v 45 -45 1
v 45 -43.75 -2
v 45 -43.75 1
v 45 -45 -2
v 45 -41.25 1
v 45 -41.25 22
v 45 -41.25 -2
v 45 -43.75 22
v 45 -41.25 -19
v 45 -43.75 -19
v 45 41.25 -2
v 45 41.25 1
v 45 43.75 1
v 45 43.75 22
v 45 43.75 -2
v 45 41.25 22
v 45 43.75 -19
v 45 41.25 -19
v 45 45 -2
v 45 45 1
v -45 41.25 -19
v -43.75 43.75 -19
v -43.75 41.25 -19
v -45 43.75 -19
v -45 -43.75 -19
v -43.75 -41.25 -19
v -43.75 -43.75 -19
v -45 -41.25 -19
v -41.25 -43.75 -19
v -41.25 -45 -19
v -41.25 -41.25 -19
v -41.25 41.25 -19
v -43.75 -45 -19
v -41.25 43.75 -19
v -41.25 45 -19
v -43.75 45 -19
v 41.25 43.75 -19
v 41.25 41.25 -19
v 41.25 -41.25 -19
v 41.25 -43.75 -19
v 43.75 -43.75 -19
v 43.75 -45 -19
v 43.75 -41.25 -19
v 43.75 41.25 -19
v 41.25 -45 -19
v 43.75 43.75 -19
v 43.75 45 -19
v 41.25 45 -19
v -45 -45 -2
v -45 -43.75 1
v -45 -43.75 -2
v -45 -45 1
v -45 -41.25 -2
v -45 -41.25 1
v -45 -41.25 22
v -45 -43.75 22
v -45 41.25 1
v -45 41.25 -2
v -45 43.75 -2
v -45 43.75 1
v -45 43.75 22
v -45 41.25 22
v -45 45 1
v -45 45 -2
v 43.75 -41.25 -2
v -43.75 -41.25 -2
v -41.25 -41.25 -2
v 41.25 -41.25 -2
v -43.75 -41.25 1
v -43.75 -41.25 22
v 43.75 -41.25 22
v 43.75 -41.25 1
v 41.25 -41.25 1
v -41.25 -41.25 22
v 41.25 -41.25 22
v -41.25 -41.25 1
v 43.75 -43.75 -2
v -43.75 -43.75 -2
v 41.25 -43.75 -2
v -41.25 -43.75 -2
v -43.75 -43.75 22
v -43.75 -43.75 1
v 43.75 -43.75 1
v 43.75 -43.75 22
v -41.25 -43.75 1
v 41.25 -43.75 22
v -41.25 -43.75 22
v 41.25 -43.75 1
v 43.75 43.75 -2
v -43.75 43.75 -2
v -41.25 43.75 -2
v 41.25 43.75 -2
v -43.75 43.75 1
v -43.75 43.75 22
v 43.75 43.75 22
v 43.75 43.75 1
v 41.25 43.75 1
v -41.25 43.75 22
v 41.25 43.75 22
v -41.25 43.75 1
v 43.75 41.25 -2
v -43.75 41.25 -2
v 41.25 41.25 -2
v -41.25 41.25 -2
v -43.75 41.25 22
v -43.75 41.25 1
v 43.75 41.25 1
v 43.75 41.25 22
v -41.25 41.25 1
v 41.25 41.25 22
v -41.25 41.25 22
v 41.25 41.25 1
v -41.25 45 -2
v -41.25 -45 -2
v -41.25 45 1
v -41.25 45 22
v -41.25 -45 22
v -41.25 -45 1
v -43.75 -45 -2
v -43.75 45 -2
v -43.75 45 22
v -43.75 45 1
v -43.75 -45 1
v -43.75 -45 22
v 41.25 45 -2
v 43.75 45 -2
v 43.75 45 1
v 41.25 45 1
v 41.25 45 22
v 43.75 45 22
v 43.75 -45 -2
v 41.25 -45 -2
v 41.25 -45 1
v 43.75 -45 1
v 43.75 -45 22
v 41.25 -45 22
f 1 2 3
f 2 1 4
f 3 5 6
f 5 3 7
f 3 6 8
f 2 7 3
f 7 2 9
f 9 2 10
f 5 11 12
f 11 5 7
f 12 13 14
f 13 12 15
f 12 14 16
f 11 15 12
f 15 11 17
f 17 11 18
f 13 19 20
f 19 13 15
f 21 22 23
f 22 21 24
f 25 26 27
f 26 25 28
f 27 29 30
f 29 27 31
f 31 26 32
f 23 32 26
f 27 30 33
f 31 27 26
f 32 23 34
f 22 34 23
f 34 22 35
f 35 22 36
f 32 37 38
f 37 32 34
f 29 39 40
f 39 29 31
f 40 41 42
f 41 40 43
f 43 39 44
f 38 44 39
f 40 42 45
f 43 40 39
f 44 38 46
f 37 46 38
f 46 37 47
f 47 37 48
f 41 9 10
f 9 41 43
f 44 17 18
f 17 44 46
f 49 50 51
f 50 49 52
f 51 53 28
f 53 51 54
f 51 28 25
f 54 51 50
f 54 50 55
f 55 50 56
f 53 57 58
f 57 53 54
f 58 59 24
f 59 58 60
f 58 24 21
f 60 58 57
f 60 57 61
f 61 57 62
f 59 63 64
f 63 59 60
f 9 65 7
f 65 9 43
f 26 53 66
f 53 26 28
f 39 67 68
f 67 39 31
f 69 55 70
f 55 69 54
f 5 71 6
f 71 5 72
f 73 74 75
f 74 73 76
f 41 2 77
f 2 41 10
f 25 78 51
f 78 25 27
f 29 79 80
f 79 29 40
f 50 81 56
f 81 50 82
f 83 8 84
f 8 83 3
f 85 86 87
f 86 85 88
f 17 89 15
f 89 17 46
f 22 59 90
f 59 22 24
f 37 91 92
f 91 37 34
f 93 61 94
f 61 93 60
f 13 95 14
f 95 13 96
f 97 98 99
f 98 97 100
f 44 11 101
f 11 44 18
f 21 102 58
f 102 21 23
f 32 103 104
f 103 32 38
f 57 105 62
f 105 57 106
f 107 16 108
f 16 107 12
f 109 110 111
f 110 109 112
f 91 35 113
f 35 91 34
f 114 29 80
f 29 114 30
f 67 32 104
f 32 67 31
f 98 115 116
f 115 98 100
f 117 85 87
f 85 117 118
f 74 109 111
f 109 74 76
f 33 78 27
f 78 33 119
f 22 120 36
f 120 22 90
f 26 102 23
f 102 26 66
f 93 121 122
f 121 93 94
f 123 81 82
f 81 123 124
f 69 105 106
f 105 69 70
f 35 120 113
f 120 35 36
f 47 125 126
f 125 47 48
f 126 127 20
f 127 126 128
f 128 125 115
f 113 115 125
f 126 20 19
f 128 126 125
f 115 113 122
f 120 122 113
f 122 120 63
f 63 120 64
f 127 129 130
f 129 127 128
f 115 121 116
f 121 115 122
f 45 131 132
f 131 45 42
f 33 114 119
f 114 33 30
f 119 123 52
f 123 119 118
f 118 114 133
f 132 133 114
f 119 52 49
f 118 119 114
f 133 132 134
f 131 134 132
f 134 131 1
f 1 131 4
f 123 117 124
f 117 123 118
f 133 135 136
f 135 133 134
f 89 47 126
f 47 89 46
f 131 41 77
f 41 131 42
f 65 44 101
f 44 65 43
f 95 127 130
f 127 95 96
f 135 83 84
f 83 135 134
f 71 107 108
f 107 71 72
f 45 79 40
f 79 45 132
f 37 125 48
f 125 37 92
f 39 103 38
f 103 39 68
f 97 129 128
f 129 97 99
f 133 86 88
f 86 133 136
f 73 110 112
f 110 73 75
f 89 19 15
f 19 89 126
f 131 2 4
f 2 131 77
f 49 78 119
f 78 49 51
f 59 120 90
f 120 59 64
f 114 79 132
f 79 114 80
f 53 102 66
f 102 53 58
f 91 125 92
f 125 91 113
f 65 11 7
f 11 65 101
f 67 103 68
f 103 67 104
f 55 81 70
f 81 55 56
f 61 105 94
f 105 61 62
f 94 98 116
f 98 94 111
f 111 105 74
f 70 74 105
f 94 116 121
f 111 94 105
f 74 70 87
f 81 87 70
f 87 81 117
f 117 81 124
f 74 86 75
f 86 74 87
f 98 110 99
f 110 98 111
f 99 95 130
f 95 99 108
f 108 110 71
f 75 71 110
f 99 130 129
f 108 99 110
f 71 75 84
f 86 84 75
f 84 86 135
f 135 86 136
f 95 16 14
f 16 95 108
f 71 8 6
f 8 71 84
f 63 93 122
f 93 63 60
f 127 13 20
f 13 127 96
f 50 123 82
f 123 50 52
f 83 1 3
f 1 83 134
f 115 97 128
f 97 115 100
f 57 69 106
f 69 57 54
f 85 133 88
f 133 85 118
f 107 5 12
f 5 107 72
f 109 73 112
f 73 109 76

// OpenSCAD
// Dimensions
outer_size = 90;          // outer X/Y size in mm
wall_thickness = 2.5;     // wall thickness in mm
top_thickness = 2;        // top plate thickness in mm
height = 40;              // total height from top plate to open top
hole_pattern_size = 71.5; // screw hole pattern square size in mm
hole_diameter = 4.5;      // screw hole diameter in mm
notch_width = 12;         // notch width in mm
notch_depth = 8;          // notch depth from top (40 - 32) in mm

// Derived dimensions
inner_size = outer_size - 2 * wall_thickness;
top_plate_size = outer_size;

// Screw hole positions (4 holes on square pattern)
hole_offset = hole_pattern_size / 2;

// Notch position: centered on one wall (Y = -inner_size/2 wall)
notch_x_center = 0;
notch_y_start = -inner_size/2;
notch_y_end = notch_y_start + notch_width;
notch_z_start = height - notch_depth;

// Top plate
module top_plate() {
    translate([0, 0, -top_thickness/2])
        cube([outer_size, outer_size, top_thickness], center=true);
}

// Walls
module walls() {
    // Front wall (Y negative side)
    translate([0, -inner_size/2, top_thickness/2])
        cube([outer_size, wall_thickness, height], center=true);
    
    // Back wall (Y positive side)
    translate([0, inner_size/2, top_thickness/2])
        cube([outer_size, wall_thickness, height], center=true);
    
    // Left wall (X negative side)
    translate([-inner_size/2, 0, top_thickness/2])
        cube([wall_thickness, outer_size, height], center=true);
    
    // Right wall (X positive side)
    translate([inner_size/2, 0, top_thickness/2])
        cube([wall_thickness, outer_size, height], center=true);
}

// Screw holes
module screw_holes() {
    for (x = [-1, 1]) {
        for (y = [-1, 1]) {
            translate([x * hole_offset, y * hole_offset, -0.01])
                cylinder(h = top_thickness + 0.02, r = hole_diameter/2, $fn = 64);
        }
    }
}

// Notch for power cable
module notch() {
    // Notch in front wall (Y negative side)
    translate([0, 0, height - notch_depth/2])
        cube([notch_width + 0.1, wall_thickness + 0.1, notch_depth + 0.02], center=true);
}

// Assemble the housing
module housing() {
    union() {
        top_plate();
        walls();
    }
    
    // Subtract screw holes
    translate([0, 0, top_thickness/2])
        difference() {
            union() {
                top_plate();
                walls();
            }
            screw_holes();
        }
    
    // Subtract notch
    translate([0, 0, top_thickness/2])
        difference() {
            union() {
                top_plate();
                walls();
            }
            translate([0, -inner_size/2 - wall_thickness/2, notch_z_start + notch_depth/2])
                cube([notch_width + 0.1, wall_thickness + 0.1, notch_depth + 0.02], center=true);
        }
}

// Render
housing();
